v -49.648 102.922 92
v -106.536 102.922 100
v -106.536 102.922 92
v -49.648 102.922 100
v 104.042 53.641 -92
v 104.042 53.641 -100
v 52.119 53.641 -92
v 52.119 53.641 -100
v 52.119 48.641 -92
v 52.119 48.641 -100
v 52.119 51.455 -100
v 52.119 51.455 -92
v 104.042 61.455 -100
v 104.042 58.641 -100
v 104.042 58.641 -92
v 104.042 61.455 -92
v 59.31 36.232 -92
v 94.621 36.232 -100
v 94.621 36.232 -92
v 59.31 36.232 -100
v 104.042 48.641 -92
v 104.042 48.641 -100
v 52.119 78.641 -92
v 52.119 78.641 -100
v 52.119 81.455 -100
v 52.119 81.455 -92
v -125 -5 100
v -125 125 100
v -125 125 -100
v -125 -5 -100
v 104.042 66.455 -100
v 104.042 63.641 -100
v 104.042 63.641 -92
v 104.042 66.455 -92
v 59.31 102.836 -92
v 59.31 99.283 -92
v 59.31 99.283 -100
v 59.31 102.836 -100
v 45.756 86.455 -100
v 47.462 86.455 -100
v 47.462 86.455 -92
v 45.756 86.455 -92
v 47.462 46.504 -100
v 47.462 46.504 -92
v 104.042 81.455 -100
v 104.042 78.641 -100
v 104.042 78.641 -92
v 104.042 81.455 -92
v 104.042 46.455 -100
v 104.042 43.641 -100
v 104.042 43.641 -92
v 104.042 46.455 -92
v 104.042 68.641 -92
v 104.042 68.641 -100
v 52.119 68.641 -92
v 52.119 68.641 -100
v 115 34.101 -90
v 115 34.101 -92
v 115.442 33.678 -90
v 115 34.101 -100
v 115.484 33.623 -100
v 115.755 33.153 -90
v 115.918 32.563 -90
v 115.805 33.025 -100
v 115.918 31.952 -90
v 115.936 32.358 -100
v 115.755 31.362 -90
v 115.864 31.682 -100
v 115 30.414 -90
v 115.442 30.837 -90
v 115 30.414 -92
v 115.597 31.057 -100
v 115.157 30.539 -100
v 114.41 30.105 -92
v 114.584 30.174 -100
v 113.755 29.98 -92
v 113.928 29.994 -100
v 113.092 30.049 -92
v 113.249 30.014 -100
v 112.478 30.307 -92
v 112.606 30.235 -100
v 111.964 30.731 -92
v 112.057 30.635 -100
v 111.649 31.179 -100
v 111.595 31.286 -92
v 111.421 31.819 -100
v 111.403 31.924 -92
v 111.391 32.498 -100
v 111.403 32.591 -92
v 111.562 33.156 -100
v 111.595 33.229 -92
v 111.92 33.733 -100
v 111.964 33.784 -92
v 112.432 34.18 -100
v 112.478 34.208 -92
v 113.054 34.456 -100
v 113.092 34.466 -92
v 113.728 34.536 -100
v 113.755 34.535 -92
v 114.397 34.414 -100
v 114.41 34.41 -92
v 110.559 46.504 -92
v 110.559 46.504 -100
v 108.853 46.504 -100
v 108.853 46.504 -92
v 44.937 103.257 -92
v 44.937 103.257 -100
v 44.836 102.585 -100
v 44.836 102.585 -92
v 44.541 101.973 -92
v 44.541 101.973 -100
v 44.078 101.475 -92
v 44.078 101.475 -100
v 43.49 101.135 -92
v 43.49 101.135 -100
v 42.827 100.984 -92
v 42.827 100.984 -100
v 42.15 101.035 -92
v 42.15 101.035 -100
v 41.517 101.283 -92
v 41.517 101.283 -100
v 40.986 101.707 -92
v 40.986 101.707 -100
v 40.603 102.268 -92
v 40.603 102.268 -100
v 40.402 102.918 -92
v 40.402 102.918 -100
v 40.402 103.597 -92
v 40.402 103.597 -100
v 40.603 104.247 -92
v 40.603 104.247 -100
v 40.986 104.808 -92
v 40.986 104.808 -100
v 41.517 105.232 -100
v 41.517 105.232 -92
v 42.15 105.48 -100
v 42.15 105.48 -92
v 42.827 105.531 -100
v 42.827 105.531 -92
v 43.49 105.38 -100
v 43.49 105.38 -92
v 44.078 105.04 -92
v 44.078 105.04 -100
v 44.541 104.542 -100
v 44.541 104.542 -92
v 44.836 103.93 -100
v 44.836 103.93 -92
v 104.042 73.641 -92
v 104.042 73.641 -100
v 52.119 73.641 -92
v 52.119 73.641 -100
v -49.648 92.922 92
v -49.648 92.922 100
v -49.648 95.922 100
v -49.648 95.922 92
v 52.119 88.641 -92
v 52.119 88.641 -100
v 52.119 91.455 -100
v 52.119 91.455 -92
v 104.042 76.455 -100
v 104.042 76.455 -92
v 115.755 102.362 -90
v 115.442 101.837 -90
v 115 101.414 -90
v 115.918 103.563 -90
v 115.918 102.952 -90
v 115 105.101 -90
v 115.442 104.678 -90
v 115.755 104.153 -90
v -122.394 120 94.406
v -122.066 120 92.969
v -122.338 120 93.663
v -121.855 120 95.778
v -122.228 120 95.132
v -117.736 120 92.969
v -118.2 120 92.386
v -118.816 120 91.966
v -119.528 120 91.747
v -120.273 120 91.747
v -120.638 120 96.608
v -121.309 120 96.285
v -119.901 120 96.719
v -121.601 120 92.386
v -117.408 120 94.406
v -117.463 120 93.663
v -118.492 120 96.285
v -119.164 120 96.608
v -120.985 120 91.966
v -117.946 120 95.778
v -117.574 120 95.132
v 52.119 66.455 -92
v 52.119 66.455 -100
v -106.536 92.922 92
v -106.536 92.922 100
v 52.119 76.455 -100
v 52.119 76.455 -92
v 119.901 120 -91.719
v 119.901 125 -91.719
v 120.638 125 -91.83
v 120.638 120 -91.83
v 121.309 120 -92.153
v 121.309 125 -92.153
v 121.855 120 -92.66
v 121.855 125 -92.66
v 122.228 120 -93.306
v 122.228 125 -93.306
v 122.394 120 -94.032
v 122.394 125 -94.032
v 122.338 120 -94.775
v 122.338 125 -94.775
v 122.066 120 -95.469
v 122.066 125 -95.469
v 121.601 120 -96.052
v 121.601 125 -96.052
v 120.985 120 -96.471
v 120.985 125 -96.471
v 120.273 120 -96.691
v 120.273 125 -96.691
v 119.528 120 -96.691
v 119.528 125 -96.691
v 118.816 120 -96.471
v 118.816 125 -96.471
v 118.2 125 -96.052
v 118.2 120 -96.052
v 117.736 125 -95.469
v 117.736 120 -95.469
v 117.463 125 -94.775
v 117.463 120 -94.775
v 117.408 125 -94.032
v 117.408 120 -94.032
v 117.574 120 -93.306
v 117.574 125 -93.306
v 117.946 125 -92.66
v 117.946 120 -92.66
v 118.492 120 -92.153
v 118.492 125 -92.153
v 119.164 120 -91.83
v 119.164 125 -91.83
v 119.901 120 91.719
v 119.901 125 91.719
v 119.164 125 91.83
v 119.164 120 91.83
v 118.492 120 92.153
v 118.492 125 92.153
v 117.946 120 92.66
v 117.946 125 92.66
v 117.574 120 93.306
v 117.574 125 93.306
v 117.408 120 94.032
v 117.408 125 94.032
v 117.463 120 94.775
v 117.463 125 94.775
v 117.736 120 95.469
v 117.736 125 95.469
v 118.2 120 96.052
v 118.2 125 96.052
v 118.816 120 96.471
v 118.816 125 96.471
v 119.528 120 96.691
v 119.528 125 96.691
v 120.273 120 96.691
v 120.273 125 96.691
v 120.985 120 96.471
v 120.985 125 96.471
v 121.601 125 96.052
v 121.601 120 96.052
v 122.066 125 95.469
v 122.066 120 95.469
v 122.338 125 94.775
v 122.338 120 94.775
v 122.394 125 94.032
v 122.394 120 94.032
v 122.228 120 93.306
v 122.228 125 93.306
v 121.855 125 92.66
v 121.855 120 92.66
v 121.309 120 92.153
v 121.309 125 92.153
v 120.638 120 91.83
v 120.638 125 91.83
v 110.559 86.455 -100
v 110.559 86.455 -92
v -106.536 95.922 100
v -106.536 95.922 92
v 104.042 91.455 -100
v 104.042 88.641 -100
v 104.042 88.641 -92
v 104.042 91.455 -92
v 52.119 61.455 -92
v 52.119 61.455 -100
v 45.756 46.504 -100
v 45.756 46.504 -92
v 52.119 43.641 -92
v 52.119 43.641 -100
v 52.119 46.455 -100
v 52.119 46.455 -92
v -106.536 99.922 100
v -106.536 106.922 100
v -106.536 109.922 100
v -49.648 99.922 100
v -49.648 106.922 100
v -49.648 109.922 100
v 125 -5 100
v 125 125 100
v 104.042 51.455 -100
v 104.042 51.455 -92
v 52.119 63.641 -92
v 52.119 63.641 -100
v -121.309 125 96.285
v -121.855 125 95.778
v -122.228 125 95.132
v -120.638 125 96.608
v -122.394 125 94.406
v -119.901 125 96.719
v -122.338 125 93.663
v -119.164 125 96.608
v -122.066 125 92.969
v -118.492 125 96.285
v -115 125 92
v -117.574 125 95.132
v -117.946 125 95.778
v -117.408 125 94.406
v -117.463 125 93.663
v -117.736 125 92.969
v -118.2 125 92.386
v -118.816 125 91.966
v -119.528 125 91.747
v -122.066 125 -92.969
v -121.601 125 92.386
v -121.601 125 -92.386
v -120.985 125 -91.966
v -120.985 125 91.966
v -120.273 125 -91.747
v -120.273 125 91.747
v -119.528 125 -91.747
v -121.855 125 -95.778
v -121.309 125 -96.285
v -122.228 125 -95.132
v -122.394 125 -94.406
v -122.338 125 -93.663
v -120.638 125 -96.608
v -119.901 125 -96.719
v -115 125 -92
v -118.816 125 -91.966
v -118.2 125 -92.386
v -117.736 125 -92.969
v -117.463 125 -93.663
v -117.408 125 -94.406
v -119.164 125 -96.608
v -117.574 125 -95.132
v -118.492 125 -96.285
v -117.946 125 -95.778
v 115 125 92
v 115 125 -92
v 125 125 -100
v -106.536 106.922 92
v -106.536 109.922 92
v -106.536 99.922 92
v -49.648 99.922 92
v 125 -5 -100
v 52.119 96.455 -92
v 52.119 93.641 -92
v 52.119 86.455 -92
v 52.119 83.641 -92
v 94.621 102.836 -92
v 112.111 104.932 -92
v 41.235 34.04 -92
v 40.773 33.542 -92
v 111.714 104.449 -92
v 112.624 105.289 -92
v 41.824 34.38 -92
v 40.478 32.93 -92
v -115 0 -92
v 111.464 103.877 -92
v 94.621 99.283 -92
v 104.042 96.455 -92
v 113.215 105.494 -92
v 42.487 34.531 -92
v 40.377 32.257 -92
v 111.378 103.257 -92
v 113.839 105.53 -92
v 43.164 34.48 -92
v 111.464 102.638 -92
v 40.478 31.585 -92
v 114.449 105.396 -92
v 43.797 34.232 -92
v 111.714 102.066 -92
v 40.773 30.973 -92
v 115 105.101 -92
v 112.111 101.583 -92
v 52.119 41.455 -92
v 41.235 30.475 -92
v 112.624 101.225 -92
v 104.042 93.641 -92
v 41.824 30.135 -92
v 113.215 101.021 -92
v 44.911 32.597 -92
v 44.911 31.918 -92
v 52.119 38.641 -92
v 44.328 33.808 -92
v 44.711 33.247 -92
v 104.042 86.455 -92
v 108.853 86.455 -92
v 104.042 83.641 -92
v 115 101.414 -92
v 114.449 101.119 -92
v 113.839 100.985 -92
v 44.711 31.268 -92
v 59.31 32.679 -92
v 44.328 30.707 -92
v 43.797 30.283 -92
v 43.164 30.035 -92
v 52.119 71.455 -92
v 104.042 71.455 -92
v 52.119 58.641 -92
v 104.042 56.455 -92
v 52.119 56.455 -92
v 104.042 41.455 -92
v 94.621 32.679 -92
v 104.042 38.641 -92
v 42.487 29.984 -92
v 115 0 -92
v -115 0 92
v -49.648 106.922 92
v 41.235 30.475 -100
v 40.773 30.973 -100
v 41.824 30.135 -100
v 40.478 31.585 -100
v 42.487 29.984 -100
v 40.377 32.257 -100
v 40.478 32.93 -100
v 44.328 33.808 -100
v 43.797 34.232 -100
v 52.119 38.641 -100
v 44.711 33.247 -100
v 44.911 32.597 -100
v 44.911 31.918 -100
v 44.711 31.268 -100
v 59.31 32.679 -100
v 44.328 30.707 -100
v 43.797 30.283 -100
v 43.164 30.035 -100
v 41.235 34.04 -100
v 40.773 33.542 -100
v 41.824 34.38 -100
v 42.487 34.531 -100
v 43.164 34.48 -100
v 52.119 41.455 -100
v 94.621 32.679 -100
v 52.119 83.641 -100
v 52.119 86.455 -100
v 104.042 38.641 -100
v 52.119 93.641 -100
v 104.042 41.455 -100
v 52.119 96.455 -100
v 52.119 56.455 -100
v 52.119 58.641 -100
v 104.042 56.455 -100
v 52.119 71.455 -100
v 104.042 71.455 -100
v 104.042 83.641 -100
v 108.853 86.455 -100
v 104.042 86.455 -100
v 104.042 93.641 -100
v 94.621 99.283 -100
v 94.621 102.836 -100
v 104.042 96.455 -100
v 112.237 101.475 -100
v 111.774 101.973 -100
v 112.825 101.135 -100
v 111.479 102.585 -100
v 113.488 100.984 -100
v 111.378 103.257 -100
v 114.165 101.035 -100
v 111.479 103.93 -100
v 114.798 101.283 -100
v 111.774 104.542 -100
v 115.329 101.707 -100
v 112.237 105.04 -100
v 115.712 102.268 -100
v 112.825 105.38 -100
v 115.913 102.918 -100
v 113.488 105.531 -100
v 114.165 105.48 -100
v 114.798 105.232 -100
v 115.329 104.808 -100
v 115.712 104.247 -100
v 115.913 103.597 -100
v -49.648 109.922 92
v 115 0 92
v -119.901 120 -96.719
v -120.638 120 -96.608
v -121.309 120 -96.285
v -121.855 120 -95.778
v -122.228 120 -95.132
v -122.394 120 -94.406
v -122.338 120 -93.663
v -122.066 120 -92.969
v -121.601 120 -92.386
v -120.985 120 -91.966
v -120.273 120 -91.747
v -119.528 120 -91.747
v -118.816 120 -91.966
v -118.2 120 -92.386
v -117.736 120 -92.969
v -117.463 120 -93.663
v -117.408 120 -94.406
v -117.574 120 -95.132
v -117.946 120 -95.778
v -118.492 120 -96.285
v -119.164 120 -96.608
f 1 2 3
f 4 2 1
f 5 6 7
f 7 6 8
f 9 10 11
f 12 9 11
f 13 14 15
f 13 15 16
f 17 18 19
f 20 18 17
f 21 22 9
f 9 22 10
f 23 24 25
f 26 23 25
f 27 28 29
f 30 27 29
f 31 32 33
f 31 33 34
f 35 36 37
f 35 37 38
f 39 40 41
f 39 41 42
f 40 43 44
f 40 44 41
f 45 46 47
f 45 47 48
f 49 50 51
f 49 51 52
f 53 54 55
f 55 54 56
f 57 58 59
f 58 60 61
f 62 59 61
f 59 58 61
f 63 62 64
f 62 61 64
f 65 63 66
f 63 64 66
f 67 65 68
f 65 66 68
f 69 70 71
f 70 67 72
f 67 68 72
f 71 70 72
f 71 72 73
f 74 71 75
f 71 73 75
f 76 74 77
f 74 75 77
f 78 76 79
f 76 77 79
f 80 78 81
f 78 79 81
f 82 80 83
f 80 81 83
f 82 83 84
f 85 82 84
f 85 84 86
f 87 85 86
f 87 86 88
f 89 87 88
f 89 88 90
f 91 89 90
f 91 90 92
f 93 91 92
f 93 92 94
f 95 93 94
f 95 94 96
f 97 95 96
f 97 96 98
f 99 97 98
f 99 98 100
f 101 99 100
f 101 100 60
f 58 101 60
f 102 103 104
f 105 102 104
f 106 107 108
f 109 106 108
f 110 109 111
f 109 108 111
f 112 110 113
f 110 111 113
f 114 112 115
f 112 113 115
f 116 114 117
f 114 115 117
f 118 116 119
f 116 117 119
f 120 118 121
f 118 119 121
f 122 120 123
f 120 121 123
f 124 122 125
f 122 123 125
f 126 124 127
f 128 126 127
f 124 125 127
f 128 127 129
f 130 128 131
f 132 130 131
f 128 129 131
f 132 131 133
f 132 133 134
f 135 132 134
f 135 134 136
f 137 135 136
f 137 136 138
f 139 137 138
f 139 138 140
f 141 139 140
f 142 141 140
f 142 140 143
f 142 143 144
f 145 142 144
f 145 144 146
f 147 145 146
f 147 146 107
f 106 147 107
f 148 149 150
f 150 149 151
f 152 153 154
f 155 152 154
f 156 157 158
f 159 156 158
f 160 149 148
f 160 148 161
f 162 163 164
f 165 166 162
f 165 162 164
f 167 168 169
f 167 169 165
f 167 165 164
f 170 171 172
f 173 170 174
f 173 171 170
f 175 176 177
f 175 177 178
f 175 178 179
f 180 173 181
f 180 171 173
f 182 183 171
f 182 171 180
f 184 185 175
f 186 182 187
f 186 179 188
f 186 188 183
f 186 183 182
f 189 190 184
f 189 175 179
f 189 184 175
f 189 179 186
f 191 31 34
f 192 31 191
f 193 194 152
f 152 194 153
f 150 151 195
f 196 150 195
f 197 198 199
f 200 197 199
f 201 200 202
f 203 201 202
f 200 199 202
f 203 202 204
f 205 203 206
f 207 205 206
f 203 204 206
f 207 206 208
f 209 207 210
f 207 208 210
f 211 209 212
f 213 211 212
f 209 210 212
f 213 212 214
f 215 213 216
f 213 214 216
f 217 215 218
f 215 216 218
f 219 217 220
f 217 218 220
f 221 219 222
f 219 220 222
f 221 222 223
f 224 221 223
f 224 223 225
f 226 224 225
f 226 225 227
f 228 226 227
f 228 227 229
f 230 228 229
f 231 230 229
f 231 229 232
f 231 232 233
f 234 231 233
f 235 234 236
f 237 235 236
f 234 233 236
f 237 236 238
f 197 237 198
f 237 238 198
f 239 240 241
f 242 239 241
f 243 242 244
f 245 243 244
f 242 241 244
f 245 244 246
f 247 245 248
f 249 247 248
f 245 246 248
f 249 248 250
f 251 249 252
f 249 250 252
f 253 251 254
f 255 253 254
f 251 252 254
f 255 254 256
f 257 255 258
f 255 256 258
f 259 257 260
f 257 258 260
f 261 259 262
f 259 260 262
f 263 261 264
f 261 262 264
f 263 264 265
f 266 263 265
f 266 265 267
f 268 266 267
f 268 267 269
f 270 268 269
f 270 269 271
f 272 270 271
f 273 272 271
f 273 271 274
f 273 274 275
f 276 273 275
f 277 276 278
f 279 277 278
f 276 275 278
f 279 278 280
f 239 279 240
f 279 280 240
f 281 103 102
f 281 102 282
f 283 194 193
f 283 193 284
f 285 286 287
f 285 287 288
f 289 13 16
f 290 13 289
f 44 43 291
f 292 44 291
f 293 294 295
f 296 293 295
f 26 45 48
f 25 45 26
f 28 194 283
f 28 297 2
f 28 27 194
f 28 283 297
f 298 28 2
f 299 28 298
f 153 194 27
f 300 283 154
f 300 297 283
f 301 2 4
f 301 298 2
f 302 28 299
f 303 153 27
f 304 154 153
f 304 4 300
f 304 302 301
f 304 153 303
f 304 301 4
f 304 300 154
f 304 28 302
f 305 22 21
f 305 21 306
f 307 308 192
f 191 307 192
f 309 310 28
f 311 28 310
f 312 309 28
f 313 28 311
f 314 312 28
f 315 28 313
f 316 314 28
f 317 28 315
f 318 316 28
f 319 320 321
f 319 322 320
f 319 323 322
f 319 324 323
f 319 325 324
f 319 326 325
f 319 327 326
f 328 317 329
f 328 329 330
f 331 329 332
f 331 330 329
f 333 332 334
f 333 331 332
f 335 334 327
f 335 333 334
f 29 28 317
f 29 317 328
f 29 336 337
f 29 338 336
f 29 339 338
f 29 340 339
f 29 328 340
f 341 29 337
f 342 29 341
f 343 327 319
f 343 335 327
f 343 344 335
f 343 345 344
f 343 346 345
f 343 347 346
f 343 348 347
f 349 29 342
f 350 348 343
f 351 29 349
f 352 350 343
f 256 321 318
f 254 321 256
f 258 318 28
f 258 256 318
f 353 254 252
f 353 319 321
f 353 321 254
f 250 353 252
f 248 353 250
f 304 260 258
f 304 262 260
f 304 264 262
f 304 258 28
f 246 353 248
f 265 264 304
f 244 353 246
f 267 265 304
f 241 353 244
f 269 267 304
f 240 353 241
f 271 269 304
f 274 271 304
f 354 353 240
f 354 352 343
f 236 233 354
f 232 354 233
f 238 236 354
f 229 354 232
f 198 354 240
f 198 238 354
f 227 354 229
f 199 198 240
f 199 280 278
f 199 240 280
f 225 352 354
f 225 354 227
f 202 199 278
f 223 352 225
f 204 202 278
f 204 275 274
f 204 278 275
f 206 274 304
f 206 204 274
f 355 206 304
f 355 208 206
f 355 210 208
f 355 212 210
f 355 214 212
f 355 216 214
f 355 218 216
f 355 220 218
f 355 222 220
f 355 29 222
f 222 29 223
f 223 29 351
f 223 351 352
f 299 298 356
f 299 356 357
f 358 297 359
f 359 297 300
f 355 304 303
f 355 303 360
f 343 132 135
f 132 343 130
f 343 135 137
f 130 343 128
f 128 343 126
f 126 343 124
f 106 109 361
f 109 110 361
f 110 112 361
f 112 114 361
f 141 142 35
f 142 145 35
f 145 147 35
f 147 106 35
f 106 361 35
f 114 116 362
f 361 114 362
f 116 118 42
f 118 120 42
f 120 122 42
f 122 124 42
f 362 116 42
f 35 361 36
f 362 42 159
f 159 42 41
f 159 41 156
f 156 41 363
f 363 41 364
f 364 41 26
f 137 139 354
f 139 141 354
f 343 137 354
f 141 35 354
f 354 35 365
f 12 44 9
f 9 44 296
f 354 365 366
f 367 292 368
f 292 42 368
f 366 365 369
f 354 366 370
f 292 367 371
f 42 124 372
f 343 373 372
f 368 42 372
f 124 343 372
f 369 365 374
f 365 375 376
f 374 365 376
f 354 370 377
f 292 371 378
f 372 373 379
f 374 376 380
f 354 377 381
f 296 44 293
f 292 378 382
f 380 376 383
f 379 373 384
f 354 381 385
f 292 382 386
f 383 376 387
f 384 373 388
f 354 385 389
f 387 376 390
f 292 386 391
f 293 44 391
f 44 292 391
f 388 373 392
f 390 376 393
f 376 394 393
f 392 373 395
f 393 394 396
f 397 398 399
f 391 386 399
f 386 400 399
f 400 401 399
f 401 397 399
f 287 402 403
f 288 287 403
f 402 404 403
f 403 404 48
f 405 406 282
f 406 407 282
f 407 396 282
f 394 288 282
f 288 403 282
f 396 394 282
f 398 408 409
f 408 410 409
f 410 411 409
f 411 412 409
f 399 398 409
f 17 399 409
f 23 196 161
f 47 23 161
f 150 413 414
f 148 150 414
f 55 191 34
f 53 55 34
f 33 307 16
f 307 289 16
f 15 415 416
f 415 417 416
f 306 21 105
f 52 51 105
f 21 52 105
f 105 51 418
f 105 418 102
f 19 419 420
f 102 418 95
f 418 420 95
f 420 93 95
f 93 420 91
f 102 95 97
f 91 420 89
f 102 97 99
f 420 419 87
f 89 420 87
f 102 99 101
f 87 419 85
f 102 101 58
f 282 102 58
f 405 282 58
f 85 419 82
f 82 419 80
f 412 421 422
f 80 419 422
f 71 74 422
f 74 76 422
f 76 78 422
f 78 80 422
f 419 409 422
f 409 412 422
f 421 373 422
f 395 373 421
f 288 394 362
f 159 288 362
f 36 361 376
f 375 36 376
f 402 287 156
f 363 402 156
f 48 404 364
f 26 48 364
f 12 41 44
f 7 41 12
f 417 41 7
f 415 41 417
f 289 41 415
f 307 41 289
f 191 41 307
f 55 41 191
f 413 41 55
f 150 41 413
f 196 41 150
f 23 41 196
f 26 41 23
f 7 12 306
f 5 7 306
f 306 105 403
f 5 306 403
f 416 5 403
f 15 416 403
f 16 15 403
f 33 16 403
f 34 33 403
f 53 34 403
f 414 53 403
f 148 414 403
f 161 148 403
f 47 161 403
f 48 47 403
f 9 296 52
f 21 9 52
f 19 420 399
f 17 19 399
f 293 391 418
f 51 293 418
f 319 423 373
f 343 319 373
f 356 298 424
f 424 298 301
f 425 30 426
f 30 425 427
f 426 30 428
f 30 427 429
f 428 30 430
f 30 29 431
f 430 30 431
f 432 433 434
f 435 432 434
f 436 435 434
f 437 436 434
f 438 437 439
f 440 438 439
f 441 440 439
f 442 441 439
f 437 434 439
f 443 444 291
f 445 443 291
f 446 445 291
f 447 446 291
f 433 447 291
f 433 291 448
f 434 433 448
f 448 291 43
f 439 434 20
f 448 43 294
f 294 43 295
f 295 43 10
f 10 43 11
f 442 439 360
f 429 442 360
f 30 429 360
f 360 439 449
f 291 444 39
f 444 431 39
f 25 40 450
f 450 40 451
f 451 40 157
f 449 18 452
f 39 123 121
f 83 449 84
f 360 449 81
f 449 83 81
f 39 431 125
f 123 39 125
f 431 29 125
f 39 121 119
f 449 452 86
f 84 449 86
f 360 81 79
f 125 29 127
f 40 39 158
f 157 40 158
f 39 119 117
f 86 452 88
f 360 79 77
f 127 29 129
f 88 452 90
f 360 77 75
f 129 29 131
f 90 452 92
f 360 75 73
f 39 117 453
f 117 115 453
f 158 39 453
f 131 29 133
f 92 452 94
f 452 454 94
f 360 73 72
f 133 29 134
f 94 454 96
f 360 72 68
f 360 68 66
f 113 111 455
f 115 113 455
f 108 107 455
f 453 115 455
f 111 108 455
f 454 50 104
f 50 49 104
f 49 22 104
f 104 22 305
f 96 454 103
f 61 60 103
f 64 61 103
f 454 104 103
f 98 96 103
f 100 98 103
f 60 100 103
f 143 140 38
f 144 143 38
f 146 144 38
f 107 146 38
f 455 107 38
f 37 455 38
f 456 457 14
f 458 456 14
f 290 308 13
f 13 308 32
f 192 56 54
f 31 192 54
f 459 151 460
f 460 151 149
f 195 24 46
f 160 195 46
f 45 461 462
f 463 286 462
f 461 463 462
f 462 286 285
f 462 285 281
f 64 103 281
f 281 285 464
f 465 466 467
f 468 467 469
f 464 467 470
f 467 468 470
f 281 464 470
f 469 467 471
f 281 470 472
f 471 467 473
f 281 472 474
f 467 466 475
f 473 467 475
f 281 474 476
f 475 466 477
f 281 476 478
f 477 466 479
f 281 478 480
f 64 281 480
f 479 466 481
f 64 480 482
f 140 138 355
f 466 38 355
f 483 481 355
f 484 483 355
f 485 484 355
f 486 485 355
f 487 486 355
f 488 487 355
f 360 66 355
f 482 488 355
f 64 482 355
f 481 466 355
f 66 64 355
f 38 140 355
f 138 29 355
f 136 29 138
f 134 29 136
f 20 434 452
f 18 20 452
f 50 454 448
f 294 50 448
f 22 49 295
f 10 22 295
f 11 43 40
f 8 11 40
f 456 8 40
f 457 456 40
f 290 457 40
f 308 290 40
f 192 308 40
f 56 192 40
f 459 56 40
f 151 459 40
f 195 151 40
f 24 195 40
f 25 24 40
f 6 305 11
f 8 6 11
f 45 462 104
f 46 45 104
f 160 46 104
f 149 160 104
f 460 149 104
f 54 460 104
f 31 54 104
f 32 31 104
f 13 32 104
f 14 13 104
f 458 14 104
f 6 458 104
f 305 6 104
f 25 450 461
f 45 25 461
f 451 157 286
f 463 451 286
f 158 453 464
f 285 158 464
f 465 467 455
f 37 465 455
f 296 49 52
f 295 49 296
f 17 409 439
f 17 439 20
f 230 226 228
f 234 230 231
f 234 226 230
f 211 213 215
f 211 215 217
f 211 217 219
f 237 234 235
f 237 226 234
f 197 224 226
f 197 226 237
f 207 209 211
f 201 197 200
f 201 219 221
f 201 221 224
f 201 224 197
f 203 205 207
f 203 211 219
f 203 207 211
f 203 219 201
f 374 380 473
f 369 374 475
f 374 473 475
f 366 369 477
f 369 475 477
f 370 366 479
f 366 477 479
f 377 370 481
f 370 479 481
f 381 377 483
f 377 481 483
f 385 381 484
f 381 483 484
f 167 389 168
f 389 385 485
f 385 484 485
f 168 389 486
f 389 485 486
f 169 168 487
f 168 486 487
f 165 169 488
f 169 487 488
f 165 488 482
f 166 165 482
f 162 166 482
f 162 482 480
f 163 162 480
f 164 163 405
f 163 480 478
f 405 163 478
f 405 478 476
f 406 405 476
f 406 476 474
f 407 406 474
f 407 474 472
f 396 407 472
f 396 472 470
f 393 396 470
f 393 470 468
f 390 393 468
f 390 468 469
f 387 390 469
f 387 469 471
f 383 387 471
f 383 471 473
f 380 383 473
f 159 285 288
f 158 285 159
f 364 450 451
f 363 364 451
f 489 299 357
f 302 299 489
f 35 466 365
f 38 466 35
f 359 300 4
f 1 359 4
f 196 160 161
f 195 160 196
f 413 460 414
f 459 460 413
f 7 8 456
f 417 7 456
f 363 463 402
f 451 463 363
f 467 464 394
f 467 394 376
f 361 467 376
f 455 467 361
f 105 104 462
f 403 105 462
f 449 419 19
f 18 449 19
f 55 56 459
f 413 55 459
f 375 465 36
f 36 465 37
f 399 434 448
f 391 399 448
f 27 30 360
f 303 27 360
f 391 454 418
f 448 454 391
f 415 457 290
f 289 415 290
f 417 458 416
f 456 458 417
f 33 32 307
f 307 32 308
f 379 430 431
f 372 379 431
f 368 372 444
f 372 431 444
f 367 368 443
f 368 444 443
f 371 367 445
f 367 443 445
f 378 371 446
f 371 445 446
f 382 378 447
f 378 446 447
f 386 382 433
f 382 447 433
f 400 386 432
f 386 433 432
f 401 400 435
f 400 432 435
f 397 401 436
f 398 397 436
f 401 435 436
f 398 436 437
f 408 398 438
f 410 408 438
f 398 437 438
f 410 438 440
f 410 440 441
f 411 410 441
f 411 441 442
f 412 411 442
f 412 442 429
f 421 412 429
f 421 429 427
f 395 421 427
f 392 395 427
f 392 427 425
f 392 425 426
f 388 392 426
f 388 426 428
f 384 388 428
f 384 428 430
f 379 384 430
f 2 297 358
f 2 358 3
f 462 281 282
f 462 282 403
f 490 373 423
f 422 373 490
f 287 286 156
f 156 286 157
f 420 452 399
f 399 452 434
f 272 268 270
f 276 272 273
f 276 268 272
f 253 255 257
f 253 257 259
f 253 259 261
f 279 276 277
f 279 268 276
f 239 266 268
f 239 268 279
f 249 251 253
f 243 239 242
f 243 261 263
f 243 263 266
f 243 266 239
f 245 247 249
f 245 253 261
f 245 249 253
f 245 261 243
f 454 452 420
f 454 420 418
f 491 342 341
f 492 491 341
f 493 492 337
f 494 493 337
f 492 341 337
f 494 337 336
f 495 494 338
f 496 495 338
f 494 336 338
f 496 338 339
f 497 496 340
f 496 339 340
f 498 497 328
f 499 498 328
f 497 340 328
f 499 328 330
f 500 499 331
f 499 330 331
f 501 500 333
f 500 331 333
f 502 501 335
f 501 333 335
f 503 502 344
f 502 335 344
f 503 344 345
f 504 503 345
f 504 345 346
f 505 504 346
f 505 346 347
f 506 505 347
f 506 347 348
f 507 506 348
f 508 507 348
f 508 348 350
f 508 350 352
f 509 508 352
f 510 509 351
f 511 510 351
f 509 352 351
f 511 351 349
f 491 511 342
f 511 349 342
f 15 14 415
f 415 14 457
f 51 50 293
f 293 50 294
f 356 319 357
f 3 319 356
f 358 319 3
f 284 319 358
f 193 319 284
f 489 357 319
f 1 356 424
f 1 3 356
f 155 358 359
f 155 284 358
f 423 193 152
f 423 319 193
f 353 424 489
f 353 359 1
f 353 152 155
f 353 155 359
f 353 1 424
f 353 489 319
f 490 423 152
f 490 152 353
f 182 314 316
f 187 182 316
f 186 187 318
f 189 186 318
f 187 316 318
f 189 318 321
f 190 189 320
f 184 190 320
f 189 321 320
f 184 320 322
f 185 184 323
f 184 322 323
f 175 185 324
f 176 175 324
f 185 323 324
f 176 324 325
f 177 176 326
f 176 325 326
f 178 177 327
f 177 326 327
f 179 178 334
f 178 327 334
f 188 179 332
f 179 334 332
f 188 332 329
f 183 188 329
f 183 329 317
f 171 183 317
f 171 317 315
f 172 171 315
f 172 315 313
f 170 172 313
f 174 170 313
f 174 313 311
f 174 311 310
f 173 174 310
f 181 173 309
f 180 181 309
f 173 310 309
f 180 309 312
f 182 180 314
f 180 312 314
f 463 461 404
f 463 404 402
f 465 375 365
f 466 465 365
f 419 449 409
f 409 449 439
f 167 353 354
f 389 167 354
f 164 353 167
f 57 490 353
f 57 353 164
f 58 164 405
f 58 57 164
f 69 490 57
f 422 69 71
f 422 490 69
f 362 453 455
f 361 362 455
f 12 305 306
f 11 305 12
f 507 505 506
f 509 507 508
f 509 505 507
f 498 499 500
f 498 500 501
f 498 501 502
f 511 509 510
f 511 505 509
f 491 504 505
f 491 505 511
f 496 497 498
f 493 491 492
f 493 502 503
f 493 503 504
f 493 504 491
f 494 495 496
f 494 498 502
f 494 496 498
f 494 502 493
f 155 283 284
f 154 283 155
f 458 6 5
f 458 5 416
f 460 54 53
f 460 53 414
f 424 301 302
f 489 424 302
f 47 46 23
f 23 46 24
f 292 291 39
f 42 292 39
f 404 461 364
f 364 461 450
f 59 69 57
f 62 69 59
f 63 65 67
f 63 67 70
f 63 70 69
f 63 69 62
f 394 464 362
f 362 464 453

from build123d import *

# Parameters (mm, degrees)
SKETCH1_W           = 250
SKETCH1_H           = 200
SKETCH1_W_2         = 230
SKETCH1_H_2         = 184
BOSS_EXTRUDE1_DEPTH = 125
SKETCH2_W           = 250
SKETCH2_H           = 200
BOSS_EXTRUDE2_DEPTH = 5
SKETCH3_R           = 2.5
CUT_EXTRUDE1_DEPTH  = 5
SKETCH4_W           = 56.888032222
SKETCH4_H           = 3
CUT_EXTRUDE2_DEPTH  = 10
SKETCH5_R           = 2.28
CUT_EXTRUDE3_DEPTH  = 10
SKETCH6_W           = 51.923491606
SKETCH6_H           = 2.813206455
SKETCH6_W_2         = 1.706106107
SKETCH6_H_2         = 39.950466237
SKETCH6_W_3         = 35.31144106
SKETCH6_H_3         = 3.552801372
CUT_EXTRUDE4_DEPTH  = 10


with BuildPart() as part:
    # Sketch1 → Boss-Extrude1 (new body)
    with BuildSketch(Plane(origin=(0, 0, 0), x_dir=(1, 0, 0), z_dir=(0, 1, 0))):
        Rectangle(SKETCH1_W, SKETCH1_H)
        Rectangle(SKETCH1_W_2, SKETCH1_H_2, mode=Mode.SUBTRACT)
    extrude(amount=BOSS_EXTRUDE1_DEPTH)

    # Sketch2 → Boss-Extrude2 (add)
    with BuildSketch(Plane(origin=(0, 0, 0), x_dir=(1, 0, 0), z_dir=(0, 1, 0))):
        Rectangle(SKETCH2_W, SKETCH2_H)
    extrude(amount=-BOSS_EXTRUDE2_DEPTH)

    # Sketch3 → Cut-Extrude1 (cut)
    with BuildSketch(Plane(origin=(0, 125, 0), x_dir=(1, 0, 0), z_dir=(0, 1, 0))):
        with Locations(Location((-119.900696791, -94.21890742, 0), (0, 0, 270))):
            Circle(SKETCH3_R)
        with Locations(Location((-119.900696791, 94.21890742, 0), (0, 0, 90))):
            Circle(SKETCH3_R)
        with Locations(Location((119.900696791, 94.21890742, 0), (0, 0, 270))):
            Circle(SKETCH3_R)
        with Locations(Location((119.900696791, -94.21890742, 0), (0, 0, 90))):
            Circle(SKETCH3_R)
    extrude(amount=-CUT_EXTRUDE1_DEPTH, mode=Mode.SUBTRACT)

    # Sketch4 → Cut-Extrude2 (cut)
    with BuildSketch(Plane.XY.offset(100)):
        with Locations((-78.091753323, 108.422214629)):
            Rectangle(SKETCH4_W, SKETCH4_H)
        with Locations((-78.091753323, 101.422214629)):
            Rectangle(SKETCH4_W, SKETCH4_H)
        with Locations((-78.091753323, 94.422214629)):
            Rectangle(SKETCH4_W, SKETCH4_H)
    extrude(amount=-CUT_EXTRUDE2_DEPTH, mode=Mode.SUBTRACT)

    # Sketch5 → Cut-Extrude3 (cut)
    with BuildSketch(Plane(origin=(0, 0, -100), x_dir=(-1, 0, 0), z_dir=(0, 0, -1))):
        with Locations((-42.656938609, 32.257458939)):
            Circle(SKETCH5_R)
        with Locations((-113.658122402, 103.257458939)):
            Circle(SKETCH5_R)
        with Locations(Location((-42.656938609, 103.257458939, 0), (0, 0, 180))):
            Circle(SKETCH5_R)
        with Locations(Location((-113.658122402, 32.257458939, 0), (0, 0, 126.053669341))):
            Circle(SKETCH5_R)
    extrude(amount=-CUT_EXTRUDE3_DEPTH, mode=Mode.SUBTRACT)

    # Sketch6 → Cut-Extrude4 (cut)
    with BuildSketch(Plane(origin=(0, 0, -100), x_dir=(-1, 0, 0), z_dir=(0, 0, -1))):
        with Locations((-78.080252777, 90.048098673)):
            Rectangle(SKETCH6_W, SKETCH6_H)
        with Locations((-78.080252777, 95.048098673)):
            Rectangle(SKETCH6_W, SKETCH6_H)
        with Locations((-78.080252777, 85.048098673)):
            Rectangle(SKETCH6_W, SKETCH6_H)
        with Locations((-78.080252777, 80.048098673)):
            Rectangle(SKETCH6_W, SKETCH6_H)
        with Locations((-78.080252777, 75.048098673)):
            Rectangle(SKETCH6_W, SKETCH6_H)
        with Locations((-78.080252777, 70.048098673)):
            Rectangle(SKETCH6_W, SKETCH6_H)
        with Locations((-78.080252777, 65.048098673)):
            Rectangle(SKETCH6_W, SKETCH6_H)
        with Locations((-78.080252777, 60.048098673)):
            Rectangle(SKETCH6_W, SKETCH6_H)
        with Locations((-78.080252777, 55.048098673)):
            Rectangle(SKETCH6_W, SKETCH6_H)
        with Locations((-78.080252777, 50.048098673)):
            Rectangle(SKETCH6_W, SKETCH6_H)
        with Locations((-78.080252777, 45.048098673)):
            Rectangle(SKETCH6_W, SKETCH6_H)
        with Locations((-78.080252777, 40.048098673)):
            Rectangle(SKETCH6_W, SKETCH6_H)
        with Locations((-109.706066926, 66.479468782)):
            Rectangle(SKETCH6_W_2, SKETCH6_H_2)
        with Locations((-46.608994087, 66.479468782)):
            Rectangle(SKETCH6_W_2, SKETCH6_H_2)
        with Locations((-76.965618839, 101.05962005)):
            Rectangle(SKETCH6_W_3, SKETCH6_H_3)
        with Locations((-76.965618839, 34.455297829)):
            Rectangle(SKETCH6_W_3, SKETCH6_H_3)
    extrude(amount=-CUT_EXTRUDE4_DEPTH, mode=Mode.SUBTRACT)


solid = part.part
